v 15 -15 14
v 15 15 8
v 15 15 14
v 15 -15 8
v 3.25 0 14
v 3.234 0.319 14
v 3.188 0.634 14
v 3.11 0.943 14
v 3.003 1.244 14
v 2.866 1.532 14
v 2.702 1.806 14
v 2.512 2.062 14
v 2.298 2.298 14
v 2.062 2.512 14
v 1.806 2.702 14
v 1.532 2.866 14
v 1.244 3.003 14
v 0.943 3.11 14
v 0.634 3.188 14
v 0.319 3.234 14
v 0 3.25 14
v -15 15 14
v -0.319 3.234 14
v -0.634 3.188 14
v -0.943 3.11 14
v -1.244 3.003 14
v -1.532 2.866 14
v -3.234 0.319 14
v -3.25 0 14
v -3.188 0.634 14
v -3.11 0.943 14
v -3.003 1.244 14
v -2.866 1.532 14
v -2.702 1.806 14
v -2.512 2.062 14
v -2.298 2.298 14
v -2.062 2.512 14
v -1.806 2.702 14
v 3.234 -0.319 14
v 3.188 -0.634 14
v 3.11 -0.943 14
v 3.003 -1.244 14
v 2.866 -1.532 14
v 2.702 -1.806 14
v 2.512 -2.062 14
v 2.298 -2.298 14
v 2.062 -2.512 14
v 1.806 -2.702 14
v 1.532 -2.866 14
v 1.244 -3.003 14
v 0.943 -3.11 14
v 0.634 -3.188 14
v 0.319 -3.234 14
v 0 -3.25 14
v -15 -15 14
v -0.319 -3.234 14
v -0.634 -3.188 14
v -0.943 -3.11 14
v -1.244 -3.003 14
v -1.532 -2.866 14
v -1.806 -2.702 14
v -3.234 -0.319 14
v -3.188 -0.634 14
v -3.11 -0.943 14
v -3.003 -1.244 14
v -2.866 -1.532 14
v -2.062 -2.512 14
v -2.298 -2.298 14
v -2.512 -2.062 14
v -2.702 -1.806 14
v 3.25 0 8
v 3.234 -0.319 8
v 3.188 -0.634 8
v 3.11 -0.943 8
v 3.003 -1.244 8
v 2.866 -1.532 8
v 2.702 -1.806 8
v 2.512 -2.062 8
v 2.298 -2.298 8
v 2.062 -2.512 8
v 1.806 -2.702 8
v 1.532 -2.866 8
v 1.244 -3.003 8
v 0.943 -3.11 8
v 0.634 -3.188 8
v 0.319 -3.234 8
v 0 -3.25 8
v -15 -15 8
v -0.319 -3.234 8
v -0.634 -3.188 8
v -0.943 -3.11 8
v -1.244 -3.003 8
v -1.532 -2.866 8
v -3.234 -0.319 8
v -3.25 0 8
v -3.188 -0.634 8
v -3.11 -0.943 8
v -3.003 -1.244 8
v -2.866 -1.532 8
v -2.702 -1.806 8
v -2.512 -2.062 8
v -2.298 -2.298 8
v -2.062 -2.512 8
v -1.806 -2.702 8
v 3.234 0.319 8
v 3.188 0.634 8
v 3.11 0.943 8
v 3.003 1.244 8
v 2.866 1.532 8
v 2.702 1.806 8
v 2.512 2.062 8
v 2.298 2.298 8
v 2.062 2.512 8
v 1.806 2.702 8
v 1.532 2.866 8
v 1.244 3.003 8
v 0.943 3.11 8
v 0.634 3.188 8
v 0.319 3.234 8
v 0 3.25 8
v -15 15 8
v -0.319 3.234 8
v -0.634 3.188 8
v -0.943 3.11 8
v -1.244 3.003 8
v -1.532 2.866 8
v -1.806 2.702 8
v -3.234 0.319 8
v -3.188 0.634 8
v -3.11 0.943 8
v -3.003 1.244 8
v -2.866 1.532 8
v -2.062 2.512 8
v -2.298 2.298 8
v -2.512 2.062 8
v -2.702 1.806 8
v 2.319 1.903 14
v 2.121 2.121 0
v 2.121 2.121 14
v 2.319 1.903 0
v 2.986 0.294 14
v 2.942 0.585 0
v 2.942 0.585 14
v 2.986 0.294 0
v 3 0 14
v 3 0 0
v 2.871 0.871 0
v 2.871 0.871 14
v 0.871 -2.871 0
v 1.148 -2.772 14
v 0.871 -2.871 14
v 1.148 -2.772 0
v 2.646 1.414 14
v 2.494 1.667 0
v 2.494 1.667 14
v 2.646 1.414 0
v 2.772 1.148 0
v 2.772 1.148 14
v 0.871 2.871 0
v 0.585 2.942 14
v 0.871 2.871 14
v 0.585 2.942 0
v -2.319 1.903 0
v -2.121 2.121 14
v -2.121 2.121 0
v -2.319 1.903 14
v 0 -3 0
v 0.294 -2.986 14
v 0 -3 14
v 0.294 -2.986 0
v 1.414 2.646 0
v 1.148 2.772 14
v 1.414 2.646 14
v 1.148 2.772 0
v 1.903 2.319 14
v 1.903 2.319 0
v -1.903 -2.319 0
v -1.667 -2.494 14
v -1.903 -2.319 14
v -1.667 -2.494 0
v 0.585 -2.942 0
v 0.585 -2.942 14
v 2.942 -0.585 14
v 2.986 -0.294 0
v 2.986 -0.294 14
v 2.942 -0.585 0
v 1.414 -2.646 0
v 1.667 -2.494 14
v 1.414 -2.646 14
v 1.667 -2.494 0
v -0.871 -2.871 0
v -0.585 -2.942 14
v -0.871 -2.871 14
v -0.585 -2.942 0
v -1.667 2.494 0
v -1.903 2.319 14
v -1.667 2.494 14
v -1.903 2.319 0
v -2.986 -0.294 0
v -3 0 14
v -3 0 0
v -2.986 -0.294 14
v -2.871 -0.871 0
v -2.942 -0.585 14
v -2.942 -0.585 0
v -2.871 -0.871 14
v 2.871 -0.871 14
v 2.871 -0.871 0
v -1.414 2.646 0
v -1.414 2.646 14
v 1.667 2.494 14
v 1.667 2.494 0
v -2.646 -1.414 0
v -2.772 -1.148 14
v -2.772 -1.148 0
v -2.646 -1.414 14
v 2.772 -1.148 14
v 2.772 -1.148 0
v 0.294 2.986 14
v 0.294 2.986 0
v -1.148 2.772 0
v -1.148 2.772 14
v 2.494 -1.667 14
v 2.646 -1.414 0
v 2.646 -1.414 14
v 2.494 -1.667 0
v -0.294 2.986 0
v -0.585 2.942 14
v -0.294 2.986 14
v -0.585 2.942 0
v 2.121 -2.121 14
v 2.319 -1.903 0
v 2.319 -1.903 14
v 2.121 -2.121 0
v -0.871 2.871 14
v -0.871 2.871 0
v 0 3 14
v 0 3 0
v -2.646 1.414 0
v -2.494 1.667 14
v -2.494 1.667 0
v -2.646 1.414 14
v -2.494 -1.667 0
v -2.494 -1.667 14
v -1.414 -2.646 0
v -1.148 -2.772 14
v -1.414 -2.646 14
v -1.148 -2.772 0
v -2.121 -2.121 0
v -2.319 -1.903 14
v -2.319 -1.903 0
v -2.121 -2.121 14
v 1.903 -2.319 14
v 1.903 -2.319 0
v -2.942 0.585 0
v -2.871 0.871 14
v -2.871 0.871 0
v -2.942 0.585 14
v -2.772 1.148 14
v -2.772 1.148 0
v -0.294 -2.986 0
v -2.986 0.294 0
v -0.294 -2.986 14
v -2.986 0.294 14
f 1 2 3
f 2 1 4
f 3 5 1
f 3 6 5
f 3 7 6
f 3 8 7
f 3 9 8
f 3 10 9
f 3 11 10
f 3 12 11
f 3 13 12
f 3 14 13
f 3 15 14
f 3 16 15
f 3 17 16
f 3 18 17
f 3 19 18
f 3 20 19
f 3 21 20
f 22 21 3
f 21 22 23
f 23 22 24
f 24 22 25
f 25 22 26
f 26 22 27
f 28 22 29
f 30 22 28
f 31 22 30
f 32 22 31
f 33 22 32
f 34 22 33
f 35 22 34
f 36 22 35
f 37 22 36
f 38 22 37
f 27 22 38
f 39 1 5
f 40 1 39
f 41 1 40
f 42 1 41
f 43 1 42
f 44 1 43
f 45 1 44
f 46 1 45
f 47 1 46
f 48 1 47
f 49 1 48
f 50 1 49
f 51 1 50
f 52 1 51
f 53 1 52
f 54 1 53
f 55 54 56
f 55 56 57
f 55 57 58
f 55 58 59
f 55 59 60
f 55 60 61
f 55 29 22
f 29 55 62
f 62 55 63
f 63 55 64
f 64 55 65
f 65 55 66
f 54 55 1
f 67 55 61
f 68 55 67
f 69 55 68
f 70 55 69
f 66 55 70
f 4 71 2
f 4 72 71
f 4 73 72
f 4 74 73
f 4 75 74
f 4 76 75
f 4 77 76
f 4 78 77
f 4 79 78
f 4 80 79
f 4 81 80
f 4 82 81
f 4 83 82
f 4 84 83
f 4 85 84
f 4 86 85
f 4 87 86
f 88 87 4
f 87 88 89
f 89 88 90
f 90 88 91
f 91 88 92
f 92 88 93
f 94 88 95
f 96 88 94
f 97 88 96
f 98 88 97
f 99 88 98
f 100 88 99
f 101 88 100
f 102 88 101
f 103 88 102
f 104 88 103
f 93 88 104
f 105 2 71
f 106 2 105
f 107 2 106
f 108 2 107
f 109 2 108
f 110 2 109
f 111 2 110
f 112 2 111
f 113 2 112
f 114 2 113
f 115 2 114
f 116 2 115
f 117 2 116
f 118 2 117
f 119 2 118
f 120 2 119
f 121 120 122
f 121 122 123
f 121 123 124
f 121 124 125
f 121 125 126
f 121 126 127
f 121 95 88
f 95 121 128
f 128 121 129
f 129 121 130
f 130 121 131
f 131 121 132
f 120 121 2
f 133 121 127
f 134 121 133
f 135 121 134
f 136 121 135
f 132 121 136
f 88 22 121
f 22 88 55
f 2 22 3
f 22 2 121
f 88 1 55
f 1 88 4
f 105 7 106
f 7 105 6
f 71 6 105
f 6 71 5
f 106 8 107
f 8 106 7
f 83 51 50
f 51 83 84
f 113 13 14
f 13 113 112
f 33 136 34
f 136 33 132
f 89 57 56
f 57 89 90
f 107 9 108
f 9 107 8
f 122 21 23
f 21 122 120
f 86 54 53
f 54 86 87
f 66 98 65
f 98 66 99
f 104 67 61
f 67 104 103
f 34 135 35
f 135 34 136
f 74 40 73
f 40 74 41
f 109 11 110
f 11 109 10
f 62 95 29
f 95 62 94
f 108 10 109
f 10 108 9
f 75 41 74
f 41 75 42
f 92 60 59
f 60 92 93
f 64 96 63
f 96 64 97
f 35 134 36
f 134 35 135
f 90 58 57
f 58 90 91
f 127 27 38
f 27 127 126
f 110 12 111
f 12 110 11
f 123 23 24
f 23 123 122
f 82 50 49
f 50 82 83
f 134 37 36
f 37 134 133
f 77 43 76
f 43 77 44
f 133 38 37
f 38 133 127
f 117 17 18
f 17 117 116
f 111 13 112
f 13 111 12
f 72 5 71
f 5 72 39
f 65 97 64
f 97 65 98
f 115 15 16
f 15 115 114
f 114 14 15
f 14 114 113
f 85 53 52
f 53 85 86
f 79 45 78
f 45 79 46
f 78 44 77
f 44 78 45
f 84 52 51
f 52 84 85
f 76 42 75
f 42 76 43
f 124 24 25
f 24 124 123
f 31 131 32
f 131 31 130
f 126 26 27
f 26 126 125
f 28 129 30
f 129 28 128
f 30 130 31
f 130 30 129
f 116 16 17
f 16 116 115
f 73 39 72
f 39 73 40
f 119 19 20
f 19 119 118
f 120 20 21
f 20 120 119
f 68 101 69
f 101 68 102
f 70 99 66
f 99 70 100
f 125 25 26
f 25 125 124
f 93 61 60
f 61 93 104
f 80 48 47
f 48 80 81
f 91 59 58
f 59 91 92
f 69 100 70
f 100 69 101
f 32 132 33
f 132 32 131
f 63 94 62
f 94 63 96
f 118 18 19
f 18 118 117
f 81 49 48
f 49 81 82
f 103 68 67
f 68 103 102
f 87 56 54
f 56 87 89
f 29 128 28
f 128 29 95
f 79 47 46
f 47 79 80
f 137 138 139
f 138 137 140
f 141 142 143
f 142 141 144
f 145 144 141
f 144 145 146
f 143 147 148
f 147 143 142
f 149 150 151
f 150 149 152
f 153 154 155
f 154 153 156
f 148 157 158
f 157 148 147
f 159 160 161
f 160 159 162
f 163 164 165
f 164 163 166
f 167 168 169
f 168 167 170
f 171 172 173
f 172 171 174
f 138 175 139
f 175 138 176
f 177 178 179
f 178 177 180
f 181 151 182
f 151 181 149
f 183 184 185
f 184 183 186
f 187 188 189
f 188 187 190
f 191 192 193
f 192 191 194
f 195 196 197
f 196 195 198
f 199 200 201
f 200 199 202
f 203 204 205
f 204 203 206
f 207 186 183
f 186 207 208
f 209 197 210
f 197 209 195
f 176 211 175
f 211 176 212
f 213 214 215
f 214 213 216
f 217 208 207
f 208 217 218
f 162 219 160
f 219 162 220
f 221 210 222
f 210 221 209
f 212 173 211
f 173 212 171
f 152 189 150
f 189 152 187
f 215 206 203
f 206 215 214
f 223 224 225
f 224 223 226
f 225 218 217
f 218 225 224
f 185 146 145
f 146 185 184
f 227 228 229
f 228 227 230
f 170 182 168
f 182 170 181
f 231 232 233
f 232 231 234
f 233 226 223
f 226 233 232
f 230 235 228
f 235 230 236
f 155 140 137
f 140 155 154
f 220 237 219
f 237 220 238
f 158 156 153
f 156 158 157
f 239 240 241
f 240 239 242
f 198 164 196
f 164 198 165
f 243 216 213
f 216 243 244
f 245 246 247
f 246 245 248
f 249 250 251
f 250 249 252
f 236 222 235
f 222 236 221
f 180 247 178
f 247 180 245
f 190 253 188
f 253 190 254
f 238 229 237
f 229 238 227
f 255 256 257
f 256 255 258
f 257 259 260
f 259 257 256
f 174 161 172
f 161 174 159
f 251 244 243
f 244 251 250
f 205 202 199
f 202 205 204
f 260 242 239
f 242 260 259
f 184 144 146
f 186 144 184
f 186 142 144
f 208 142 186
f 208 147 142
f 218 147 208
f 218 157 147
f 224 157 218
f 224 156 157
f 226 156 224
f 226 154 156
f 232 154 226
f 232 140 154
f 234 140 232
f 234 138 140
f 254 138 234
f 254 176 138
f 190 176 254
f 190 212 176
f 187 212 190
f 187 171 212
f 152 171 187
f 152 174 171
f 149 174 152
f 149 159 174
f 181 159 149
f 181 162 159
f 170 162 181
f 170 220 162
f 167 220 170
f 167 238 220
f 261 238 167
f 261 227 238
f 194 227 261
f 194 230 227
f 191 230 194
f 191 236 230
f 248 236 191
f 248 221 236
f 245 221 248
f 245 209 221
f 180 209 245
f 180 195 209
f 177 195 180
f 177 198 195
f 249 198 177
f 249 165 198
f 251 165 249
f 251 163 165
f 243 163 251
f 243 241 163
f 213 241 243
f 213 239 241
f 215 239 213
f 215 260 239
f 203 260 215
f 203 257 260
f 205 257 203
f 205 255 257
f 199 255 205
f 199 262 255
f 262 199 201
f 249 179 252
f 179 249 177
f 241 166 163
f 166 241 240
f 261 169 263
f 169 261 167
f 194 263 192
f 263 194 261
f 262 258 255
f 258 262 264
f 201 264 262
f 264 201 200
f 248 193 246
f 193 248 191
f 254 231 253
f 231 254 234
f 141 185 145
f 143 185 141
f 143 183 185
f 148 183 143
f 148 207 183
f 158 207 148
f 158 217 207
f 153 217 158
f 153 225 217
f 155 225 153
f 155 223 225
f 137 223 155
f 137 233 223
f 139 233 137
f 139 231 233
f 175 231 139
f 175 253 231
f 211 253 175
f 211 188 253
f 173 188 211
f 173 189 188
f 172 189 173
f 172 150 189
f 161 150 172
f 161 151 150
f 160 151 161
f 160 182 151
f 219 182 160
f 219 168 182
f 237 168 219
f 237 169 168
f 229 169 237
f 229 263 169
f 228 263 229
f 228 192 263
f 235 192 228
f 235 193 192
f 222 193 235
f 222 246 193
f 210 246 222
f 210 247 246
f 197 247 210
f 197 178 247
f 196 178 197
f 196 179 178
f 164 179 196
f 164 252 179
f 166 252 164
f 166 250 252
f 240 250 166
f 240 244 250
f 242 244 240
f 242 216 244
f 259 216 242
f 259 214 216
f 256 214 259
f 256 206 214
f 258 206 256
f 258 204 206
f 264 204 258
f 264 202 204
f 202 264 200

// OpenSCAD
// part: peg
// part: socket
// fit: peg~socket class=LC
// gravity: -z

peg_diameter = 6;
peg_height = 14;
hole_diameter = peg_diameter + 0.50;
plate_size = 30;
plate_thickness = 6;

module peg() {
    cylinder(h=peg_height, d=peg_diameter, $fn=64);
}
module socket() {
    z_floor = peg_height - plate_thickness;
    translate([0, 0, z_floor])
        difference() {
            translate([-plate_size / 2, -plate_size / 2, 0])
                cube([plate_size, plate_size, plate_thickness]);
            translate([0, 0, -0.1])
                cylinder(h=plate_thickness + 0.2, d=hole_diameter, $fn=64);
        }
}
module assembly() { peg(); socket(); }
assembly();
